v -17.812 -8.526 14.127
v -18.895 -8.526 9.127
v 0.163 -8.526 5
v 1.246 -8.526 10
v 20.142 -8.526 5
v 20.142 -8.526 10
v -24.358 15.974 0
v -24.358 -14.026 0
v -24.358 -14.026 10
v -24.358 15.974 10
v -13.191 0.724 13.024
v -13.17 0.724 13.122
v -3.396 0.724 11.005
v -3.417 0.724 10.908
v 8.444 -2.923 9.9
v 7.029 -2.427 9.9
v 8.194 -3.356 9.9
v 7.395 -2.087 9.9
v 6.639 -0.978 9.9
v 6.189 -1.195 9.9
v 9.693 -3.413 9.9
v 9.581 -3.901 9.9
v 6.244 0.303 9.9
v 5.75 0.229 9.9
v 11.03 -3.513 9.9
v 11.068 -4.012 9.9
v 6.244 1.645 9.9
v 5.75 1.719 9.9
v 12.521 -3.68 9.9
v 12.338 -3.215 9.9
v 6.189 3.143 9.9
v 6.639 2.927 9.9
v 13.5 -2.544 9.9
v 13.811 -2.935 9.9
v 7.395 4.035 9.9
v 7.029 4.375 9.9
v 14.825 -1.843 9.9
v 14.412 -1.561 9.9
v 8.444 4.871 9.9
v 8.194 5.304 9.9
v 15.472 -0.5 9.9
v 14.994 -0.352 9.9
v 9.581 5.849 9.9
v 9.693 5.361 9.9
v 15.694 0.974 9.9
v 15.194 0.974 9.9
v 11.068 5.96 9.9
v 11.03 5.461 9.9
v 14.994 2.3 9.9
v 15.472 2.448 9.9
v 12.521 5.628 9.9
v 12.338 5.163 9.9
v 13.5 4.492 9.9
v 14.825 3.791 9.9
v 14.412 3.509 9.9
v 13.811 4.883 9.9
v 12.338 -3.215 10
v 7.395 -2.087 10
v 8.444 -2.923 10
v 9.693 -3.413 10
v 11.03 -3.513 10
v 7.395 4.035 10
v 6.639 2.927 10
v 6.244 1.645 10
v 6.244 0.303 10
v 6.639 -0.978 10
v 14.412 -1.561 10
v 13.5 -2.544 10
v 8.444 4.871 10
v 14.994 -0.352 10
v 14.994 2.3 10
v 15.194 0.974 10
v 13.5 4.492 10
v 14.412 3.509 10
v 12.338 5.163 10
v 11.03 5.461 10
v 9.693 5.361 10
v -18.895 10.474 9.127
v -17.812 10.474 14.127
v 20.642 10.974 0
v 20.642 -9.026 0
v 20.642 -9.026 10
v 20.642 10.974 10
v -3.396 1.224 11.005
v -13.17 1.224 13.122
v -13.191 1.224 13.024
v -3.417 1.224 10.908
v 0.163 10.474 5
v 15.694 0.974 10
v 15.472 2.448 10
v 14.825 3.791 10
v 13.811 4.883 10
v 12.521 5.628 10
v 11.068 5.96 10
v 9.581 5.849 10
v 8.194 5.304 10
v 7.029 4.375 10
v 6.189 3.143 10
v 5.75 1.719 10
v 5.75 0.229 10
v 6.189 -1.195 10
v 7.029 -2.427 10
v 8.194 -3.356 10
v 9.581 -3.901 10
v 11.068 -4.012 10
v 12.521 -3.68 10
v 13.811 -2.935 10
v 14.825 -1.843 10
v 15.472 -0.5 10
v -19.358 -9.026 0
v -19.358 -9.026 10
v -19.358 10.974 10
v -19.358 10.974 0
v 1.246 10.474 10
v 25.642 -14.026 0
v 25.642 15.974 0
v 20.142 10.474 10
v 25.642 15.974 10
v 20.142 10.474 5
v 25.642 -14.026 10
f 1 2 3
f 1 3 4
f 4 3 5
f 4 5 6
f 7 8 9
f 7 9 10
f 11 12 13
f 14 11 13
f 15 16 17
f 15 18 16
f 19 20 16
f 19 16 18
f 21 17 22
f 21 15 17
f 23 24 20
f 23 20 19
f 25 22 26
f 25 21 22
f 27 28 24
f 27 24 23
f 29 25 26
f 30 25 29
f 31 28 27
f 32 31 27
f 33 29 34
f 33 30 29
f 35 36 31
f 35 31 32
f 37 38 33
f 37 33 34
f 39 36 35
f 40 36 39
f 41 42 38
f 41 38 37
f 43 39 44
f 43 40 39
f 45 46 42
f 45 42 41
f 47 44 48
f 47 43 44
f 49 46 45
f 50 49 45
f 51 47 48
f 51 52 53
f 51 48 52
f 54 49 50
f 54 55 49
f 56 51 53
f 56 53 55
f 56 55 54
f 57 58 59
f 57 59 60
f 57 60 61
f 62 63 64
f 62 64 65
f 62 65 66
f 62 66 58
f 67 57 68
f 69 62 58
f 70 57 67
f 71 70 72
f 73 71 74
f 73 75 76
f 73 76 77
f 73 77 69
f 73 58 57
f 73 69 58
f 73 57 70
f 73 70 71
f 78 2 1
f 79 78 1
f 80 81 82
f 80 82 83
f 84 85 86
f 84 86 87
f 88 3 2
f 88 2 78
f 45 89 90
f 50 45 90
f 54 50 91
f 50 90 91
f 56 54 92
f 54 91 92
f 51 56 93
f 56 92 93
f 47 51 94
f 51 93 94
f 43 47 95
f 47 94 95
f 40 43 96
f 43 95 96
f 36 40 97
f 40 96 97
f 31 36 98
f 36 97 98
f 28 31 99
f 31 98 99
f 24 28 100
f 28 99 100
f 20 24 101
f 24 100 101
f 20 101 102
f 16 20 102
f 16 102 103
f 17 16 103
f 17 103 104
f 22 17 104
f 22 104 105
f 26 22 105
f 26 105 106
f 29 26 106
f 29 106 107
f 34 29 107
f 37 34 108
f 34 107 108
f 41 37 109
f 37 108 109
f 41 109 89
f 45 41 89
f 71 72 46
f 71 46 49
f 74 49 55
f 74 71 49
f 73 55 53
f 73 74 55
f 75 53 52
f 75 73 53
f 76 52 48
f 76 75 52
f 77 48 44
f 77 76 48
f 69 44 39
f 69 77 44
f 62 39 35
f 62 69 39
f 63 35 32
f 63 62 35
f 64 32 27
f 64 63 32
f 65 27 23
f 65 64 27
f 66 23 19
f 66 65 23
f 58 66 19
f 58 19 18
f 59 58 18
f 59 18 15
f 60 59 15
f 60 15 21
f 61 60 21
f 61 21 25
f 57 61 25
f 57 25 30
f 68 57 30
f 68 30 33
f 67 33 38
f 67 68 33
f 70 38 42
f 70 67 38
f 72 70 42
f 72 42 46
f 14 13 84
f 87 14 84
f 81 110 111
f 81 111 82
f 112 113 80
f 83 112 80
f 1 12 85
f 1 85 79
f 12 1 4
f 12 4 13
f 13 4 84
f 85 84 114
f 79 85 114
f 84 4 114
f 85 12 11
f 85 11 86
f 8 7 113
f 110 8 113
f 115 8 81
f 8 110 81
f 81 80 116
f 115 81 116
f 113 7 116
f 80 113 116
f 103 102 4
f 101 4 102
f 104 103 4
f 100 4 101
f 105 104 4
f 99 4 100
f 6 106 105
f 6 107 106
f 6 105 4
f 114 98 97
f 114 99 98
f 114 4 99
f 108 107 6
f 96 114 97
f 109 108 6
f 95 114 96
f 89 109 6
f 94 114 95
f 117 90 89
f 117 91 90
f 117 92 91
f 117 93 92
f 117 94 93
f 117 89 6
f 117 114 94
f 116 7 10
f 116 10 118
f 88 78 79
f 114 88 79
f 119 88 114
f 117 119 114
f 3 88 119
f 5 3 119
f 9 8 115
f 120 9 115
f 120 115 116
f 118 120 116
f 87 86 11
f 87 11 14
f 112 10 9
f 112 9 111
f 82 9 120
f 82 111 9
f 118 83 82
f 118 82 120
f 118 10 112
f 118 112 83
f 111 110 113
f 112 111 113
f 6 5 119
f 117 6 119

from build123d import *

# Parameters (mm, degrees)
SKETCH1_W           = 50
SKETCH1_H           = 30
SKETCH1_W_2         = 40
SKETCH1_H_2         = 20
EXTRUDE_THIN2_DEPTH = 10
SKETCH2_W           = 20
SKETCH2_H           = 19
BOSS_EXTRUDE1_DEPTH = 5
CUT_EXTRUDE1_DEPTH  = 19
SKETCH6_W           = 5.115875382
SKETCH6_H           = 19
BOSS_EXTRUDE2_DEPTH = 19.5
SKETCH7_R           = 5
SKETCH7_R_2         = 4.5
CUT_EXTRUDE3_DEPTH  = 0.1
SKETCH9_W           = 10
SKETCH9_H           = 0.5
CUT_EXTRUDE4_DEPTH  = 0.1


with BuildPart() as part:
    # Sketch1 → Extrude-Thin2 (new body)
    with BuildSketch(Plane.XY):
        with Locations((0.641550344, 0.974061664)):
            Rectangle(SKETCH1_W, SKETCH1_H)
        with Locations((0.641550344, 0.974061664)):
            Rectangle(SKETCH1_W_2, SKETCH1_H_2, mode=Mode.SUBTRACT)
    extrude(amount=EXTRUDE_THIN2_DEPTH)


with BuildPart() as body_2:
    # Sketch2 → Boss-Extrude1 (new body)
    with BuildSketch(Plane.XY.offset(5)):
        with Locations((10.141550344, 0.974061664)):
            Rectangle(SKETCH2_W, SKETCH2_H)
    extrude(amount=BOSS_EXTRUDE1_DEPTH)

    # Sketch3 → Cut-Extrude1 (cut)
    with BuildSketch(Plane.XZ.offset(8.525938336)):
        Polygon((0.141550344, 4.898701044), (1.246158119, 10), (0.141550344, 10), align=None)
    extrude(amount=-CUT_EXTRUDE1_DEPTH, mode=Mode.SUBTRACT)

    # Sketch6 → Boss-Extrude2 (add)
    with BuildSketch(Plane(origin=(-0.878020037, 0, 0.190121725), x_dir=(0.21163006596186237, 0, 0.9773498427794307), z_dir=(-0.9773498427794306, 0, 0.21163006596186235))):
        with Locations((7.479285262, 0.974061664)):
            Rectangle(SKETCH6_W, SKETCH6_H)
    extrude(amount=BOSS_EXTRUDE2_DEPTH)

    # Sketch7 → Cut-Extrude3 (cut)
    with BuildSketch(Plane.XY.offset(10)):
        with Locations((10.693854232, 0.974061664)):
            Circle(SKETCH7_R)
        with Locations((10.693854232, 0.974061664)):
            Circle(SKETCH7_R_2, mode=Mode.SUBTRACT)
    extrude(amount=-CUT_EXTRUDE3_DEPTH, mode=Mode.SUBTRACT)

    # Sketch9 → Cut-Extrude4 (cut)
    with BuildSketch(Plane(origin=(2.124178156, 0, 9.809878275), x_dir=(0.9773498427794307, 0, -0.21163006596186243), z_dir=(0.21163006596186243, 0, 0.9773498427794307))):
        with Locations((-10.648368218, 0.974061664)):
            Rectangle(SKETCH9_W, SKETCH9_H)
    extrude(amount=-CUT_EXTRUDE4_DEPTH, mode=Mode.SUBTRACT)


solid = Compound([part.part, body_2.part])
